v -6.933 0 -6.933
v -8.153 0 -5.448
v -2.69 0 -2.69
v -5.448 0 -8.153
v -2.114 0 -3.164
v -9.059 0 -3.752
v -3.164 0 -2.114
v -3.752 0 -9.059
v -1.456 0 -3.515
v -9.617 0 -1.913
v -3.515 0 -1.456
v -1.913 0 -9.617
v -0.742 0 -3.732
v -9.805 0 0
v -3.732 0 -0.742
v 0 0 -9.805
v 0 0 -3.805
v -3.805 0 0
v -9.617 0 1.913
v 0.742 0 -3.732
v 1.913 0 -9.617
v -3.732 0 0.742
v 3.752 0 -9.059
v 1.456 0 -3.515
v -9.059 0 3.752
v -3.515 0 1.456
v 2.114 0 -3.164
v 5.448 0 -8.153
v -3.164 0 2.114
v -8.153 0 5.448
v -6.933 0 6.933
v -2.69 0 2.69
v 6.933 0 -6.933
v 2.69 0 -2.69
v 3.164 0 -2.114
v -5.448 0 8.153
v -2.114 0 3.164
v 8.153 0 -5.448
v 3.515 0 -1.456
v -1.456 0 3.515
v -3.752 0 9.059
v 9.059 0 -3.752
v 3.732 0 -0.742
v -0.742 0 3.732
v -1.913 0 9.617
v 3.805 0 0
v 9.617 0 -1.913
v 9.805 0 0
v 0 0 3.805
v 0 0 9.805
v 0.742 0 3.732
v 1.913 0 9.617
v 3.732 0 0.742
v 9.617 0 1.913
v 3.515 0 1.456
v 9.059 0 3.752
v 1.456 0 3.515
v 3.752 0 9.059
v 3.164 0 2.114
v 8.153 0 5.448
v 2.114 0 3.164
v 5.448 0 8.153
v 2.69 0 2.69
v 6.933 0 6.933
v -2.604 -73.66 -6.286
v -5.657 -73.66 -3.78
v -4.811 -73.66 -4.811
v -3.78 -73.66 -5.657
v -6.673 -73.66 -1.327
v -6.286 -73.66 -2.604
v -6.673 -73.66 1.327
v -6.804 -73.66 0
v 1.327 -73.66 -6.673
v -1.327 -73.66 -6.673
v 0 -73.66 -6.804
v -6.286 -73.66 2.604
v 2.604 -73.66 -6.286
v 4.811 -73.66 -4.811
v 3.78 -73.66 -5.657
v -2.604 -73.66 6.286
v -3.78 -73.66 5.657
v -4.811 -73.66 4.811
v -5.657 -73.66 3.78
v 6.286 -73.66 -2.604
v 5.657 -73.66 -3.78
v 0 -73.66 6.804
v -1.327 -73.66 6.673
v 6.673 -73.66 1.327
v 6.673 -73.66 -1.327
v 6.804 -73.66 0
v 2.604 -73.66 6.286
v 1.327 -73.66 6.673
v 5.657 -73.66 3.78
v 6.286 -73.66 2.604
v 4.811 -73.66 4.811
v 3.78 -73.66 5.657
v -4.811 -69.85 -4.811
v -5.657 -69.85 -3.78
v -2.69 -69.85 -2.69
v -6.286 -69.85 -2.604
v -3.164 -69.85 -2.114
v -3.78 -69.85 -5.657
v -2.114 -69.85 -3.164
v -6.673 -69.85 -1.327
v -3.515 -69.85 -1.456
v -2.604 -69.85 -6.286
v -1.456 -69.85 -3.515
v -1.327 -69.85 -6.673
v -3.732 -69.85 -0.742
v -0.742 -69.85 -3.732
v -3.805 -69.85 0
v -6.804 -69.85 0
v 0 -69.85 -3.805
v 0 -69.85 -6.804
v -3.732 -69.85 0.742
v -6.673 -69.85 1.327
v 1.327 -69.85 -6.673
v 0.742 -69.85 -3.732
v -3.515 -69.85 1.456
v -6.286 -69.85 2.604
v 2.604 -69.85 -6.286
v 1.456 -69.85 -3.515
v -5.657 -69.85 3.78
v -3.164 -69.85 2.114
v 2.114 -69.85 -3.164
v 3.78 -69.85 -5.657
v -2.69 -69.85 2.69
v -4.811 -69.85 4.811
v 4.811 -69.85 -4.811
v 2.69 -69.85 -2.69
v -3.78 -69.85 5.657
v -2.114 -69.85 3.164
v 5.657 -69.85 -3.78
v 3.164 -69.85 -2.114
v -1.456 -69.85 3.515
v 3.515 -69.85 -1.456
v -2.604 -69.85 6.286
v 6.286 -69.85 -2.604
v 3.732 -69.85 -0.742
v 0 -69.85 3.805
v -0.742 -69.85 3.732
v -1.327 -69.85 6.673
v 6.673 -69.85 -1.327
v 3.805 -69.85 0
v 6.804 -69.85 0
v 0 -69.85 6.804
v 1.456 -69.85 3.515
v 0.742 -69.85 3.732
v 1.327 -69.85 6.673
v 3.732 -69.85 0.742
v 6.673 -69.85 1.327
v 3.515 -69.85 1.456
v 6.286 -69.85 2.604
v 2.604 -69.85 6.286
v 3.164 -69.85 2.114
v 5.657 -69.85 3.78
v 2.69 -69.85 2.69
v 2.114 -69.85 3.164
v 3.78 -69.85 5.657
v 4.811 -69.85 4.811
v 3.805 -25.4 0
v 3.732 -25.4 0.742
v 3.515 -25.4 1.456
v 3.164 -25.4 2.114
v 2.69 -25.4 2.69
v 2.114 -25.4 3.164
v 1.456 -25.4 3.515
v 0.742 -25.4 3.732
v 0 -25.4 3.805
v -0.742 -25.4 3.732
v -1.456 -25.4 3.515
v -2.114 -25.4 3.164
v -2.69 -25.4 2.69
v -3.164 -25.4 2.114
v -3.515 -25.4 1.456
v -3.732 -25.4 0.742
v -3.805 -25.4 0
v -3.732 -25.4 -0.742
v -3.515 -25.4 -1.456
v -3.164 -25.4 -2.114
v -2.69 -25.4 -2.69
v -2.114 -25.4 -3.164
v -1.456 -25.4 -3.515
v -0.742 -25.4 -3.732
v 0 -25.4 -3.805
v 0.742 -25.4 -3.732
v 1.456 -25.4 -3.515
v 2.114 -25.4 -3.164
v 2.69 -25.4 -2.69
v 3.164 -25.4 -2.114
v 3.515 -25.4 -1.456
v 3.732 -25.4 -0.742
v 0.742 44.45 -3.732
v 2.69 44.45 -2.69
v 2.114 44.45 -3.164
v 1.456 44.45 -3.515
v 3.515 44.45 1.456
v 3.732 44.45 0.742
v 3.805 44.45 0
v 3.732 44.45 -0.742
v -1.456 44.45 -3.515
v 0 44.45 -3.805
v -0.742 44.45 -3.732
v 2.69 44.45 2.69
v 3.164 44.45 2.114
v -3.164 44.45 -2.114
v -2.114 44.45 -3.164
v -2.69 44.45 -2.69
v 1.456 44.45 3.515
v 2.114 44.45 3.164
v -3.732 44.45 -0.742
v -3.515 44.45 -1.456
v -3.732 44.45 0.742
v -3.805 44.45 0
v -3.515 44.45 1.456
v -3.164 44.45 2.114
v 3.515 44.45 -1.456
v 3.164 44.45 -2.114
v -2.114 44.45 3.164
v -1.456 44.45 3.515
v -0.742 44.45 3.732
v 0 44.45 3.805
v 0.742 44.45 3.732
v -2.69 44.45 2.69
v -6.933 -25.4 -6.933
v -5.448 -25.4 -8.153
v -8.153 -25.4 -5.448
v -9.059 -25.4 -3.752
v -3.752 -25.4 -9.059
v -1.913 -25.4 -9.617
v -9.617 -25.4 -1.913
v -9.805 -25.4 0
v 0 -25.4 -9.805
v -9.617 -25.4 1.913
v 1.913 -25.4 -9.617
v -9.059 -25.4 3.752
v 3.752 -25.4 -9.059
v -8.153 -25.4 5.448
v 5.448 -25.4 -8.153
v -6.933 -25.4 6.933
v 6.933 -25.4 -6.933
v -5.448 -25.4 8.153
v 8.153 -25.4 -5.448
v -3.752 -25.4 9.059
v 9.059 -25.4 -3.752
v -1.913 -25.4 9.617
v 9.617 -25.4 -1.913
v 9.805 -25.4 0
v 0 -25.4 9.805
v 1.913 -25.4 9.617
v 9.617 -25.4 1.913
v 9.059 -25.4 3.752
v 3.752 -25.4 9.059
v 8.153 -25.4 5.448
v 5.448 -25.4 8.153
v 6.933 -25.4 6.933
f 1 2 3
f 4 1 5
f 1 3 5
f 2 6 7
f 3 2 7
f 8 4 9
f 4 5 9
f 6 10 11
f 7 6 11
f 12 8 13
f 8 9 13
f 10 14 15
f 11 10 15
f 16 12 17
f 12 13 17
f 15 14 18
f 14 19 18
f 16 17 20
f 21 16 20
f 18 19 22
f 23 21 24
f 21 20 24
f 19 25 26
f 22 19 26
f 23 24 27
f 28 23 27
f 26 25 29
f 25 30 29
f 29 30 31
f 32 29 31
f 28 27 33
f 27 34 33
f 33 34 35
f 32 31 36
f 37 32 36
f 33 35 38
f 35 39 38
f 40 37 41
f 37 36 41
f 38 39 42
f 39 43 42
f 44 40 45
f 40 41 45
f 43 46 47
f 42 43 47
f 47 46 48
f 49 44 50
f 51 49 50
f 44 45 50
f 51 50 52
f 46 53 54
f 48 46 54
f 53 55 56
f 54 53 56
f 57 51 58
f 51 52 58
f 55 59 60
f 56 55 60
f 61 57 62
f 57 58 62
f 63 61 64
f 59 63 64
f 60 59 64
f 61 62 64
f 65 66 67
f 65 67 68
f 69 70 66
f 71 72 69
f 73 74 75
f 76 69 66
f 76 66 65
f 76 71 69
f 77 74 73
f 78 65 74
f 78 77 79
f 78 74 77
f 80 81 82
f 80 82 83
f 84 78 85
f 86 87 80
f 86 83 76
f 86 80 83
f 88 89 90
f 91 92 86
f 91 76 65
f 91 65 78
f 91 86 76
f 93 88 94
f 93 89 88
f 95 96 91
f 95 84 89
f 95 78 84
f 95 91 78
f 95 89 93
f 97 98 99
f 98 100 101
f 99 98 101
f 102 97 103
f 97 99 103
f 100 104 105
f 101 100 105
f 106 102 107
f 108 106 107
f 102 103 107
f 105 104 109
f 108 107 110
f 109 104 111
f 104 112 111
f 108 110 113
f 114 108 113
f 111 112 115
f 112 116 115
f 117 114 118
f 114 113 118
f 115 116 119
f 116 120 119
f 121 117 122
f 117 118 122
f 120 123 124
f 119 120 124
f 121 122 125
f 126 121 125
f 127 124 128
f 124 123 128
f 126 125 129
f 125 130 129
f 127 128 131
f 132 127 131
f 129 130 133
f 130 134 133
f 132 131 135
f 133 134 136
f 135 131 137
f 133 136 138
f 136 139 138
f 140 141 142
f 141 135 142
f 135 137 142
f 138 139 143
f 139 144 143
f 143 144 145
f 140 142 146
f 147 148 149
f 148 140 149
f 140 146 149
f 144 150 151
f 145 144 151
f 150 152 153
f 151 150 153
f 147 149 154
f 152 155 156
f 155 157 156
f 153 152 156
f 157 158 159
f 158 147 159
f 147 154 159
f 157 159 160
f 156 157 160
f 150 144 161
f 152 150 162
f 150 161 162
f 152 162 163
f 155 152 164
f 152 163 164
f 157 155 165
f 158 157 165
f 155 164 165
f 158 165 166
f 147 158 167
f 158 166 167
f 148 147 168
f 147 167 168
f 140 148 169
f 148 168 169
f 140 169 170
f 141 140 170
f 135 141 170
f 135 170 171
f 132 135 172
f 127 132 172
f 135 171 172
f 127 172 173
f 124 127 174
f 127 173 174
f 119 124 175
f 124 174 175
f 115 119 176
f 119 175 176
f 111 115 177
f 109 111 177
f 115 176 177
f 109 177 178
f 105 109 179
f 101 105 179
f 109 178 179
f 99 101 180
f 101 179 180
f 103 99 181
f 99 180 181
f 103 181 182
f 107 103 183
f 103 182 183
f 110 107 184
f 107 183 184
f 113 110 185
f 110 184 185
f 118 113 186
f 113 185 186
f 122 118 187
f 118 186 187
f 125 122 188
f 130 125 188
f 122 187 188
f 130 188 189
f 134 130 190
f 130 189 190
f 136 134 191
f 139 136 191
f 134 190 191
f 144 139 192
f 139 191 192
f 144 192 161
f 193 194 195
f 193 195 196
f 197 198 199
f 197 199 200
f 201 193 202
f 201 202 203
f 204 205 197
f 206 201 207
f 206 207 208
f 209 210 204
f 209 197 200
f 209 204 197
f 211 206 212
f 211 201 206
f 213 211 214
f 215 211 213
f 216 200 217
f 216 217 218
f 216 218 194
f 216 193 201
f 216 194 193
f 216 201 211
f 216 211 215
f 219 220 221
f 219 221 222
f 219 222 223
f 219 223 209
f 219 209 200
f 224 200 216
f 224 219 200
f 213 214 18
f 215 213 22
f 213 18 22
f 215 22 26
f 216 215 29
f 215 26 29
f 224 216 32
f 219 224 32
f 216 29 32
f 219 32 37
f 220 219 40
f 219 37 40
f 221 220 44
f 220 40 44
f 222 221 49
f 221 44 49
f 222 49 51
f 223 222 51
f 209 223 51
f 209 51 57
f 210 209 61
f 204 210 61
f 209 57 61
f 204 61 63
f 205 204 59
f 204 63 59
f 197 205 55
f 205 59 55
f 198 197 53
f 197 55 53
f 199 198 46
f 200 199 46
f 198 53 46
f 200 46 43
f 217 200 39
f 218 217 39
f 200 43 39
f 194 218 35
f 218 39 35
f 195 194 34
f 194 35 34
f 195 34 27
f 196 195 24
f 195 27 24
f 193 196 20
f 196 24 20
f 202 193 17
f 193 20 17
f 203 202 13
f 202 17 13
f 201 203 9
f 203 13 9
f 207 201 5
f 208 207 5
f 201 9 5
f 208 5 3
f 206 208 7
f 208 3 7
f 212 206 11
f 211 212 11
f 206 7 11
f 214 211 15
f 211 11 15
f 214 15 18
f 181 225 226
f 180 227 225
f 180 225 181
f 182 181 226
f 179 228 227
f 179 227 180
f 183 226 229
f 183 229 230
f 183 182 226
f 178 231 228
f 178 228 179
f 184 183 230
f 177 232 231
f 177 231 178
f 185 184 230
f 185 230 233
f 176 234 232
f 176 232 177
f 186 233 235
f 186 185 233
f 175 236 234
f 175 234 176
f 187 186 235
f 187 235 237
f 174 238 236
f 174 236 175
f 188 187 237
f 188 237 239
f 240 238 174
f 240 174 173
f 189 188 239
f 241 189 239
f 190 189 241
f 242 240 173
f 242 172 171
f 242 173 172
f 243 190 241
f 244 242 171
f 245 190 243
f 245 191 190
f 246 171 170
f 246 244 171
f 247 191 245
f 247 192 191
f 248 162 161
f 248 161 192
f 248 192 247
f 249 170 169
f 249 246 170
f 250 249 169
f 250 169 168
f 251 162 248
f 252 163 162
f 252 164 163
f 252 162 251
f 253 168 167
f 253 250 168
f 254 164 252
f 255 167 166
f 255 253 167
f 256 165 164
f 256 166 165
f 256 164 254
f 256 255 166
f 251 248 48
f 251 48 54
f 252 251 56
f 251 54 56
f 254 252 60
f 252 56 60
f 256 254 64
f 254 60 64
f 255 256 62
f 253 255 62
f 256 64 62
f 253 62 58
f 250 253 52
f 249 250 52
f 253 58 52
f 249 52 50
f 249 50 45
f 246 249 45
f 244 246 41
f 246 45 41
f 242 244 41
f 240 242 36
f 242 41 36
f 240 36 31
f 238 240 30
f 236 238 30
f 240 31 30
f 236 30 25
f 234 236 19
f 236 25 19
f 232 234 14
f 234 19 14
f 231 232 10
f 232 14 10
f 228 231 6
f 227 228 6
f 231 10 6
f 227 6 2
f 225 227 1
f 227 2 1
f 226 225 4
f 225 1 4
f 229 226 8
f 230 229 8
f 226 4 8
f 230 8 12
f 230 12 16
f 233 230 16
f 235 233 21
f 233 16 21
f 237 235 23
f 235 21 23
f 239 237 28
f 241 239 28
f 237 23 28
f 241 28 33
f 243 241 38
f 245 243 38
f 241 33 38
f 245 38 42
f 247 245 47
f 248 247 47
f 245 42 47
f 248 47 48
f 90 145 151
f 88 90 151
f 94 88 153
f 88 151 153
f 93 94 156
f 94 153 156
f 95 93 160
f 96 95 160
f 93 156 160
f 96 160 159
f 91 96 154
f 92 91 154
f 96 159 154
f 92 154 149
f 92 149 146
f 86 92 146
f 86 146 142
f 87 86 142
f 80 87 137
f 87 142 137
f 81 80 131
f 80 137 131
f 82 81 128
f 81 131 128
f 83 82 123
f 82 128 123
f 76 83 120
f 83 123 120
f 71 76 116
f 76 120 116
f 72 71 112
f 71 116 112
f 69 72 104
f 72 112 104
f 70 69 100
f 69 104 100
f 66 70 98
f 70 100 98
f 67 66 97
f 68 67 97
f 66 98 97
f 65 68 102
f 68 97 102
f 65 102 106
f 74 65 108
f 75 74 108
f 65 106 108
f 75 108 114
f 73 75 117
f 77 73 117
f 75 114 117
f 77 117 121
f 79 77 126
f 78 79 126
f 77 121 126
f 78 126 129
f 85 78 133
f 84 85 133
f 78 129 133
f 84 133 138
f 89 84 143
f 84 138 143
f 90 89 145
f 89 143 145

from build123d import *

# Parameters (mm, degrees)
F0_R     = 9.8054228033
F1_DEPTH = 25.4
F3_R     = 3.8049000848
F4_DEPTH = 44.45
F2_R     = 3.804929308
F5_DEPTH = 44.45
F6_R     = 6.8035972376
F7_DEPTH = 3.81


# Not quite as in the source:
# - a feature names something its author has since deleted; it is built from what else it names


with BuildPart() as f1:
    # F0 (on Front) → F1 (new body)
    with BuildSketch(Plane.XZ):
        Circle(F0_R)
    extrude(amount=F1_DEPTH)

    # F3 (on face) → F4 (join)
    with BuildSketch(Plane(origin=(0, 0, 0), x_dir=(-1, 0, 0), z_dir=(0, 1, 0))):
        Circle(F3_R)
    extrude(amount=F4_DEPTH)

    # F2 (on face) → F5 (join)
    with BuildSketch(Plane.XZ.offset(25.4)):
        Circle(F2_R)
    extrude(amount=F5_DEPTH)

    # F6 (on face) → F7 (join)
    with BuildSketch(Plane.XZ.offset(69.85)):
        Circle(F6_R)
    extrude(amount=F7_DEPTH)


solid = f1.part
